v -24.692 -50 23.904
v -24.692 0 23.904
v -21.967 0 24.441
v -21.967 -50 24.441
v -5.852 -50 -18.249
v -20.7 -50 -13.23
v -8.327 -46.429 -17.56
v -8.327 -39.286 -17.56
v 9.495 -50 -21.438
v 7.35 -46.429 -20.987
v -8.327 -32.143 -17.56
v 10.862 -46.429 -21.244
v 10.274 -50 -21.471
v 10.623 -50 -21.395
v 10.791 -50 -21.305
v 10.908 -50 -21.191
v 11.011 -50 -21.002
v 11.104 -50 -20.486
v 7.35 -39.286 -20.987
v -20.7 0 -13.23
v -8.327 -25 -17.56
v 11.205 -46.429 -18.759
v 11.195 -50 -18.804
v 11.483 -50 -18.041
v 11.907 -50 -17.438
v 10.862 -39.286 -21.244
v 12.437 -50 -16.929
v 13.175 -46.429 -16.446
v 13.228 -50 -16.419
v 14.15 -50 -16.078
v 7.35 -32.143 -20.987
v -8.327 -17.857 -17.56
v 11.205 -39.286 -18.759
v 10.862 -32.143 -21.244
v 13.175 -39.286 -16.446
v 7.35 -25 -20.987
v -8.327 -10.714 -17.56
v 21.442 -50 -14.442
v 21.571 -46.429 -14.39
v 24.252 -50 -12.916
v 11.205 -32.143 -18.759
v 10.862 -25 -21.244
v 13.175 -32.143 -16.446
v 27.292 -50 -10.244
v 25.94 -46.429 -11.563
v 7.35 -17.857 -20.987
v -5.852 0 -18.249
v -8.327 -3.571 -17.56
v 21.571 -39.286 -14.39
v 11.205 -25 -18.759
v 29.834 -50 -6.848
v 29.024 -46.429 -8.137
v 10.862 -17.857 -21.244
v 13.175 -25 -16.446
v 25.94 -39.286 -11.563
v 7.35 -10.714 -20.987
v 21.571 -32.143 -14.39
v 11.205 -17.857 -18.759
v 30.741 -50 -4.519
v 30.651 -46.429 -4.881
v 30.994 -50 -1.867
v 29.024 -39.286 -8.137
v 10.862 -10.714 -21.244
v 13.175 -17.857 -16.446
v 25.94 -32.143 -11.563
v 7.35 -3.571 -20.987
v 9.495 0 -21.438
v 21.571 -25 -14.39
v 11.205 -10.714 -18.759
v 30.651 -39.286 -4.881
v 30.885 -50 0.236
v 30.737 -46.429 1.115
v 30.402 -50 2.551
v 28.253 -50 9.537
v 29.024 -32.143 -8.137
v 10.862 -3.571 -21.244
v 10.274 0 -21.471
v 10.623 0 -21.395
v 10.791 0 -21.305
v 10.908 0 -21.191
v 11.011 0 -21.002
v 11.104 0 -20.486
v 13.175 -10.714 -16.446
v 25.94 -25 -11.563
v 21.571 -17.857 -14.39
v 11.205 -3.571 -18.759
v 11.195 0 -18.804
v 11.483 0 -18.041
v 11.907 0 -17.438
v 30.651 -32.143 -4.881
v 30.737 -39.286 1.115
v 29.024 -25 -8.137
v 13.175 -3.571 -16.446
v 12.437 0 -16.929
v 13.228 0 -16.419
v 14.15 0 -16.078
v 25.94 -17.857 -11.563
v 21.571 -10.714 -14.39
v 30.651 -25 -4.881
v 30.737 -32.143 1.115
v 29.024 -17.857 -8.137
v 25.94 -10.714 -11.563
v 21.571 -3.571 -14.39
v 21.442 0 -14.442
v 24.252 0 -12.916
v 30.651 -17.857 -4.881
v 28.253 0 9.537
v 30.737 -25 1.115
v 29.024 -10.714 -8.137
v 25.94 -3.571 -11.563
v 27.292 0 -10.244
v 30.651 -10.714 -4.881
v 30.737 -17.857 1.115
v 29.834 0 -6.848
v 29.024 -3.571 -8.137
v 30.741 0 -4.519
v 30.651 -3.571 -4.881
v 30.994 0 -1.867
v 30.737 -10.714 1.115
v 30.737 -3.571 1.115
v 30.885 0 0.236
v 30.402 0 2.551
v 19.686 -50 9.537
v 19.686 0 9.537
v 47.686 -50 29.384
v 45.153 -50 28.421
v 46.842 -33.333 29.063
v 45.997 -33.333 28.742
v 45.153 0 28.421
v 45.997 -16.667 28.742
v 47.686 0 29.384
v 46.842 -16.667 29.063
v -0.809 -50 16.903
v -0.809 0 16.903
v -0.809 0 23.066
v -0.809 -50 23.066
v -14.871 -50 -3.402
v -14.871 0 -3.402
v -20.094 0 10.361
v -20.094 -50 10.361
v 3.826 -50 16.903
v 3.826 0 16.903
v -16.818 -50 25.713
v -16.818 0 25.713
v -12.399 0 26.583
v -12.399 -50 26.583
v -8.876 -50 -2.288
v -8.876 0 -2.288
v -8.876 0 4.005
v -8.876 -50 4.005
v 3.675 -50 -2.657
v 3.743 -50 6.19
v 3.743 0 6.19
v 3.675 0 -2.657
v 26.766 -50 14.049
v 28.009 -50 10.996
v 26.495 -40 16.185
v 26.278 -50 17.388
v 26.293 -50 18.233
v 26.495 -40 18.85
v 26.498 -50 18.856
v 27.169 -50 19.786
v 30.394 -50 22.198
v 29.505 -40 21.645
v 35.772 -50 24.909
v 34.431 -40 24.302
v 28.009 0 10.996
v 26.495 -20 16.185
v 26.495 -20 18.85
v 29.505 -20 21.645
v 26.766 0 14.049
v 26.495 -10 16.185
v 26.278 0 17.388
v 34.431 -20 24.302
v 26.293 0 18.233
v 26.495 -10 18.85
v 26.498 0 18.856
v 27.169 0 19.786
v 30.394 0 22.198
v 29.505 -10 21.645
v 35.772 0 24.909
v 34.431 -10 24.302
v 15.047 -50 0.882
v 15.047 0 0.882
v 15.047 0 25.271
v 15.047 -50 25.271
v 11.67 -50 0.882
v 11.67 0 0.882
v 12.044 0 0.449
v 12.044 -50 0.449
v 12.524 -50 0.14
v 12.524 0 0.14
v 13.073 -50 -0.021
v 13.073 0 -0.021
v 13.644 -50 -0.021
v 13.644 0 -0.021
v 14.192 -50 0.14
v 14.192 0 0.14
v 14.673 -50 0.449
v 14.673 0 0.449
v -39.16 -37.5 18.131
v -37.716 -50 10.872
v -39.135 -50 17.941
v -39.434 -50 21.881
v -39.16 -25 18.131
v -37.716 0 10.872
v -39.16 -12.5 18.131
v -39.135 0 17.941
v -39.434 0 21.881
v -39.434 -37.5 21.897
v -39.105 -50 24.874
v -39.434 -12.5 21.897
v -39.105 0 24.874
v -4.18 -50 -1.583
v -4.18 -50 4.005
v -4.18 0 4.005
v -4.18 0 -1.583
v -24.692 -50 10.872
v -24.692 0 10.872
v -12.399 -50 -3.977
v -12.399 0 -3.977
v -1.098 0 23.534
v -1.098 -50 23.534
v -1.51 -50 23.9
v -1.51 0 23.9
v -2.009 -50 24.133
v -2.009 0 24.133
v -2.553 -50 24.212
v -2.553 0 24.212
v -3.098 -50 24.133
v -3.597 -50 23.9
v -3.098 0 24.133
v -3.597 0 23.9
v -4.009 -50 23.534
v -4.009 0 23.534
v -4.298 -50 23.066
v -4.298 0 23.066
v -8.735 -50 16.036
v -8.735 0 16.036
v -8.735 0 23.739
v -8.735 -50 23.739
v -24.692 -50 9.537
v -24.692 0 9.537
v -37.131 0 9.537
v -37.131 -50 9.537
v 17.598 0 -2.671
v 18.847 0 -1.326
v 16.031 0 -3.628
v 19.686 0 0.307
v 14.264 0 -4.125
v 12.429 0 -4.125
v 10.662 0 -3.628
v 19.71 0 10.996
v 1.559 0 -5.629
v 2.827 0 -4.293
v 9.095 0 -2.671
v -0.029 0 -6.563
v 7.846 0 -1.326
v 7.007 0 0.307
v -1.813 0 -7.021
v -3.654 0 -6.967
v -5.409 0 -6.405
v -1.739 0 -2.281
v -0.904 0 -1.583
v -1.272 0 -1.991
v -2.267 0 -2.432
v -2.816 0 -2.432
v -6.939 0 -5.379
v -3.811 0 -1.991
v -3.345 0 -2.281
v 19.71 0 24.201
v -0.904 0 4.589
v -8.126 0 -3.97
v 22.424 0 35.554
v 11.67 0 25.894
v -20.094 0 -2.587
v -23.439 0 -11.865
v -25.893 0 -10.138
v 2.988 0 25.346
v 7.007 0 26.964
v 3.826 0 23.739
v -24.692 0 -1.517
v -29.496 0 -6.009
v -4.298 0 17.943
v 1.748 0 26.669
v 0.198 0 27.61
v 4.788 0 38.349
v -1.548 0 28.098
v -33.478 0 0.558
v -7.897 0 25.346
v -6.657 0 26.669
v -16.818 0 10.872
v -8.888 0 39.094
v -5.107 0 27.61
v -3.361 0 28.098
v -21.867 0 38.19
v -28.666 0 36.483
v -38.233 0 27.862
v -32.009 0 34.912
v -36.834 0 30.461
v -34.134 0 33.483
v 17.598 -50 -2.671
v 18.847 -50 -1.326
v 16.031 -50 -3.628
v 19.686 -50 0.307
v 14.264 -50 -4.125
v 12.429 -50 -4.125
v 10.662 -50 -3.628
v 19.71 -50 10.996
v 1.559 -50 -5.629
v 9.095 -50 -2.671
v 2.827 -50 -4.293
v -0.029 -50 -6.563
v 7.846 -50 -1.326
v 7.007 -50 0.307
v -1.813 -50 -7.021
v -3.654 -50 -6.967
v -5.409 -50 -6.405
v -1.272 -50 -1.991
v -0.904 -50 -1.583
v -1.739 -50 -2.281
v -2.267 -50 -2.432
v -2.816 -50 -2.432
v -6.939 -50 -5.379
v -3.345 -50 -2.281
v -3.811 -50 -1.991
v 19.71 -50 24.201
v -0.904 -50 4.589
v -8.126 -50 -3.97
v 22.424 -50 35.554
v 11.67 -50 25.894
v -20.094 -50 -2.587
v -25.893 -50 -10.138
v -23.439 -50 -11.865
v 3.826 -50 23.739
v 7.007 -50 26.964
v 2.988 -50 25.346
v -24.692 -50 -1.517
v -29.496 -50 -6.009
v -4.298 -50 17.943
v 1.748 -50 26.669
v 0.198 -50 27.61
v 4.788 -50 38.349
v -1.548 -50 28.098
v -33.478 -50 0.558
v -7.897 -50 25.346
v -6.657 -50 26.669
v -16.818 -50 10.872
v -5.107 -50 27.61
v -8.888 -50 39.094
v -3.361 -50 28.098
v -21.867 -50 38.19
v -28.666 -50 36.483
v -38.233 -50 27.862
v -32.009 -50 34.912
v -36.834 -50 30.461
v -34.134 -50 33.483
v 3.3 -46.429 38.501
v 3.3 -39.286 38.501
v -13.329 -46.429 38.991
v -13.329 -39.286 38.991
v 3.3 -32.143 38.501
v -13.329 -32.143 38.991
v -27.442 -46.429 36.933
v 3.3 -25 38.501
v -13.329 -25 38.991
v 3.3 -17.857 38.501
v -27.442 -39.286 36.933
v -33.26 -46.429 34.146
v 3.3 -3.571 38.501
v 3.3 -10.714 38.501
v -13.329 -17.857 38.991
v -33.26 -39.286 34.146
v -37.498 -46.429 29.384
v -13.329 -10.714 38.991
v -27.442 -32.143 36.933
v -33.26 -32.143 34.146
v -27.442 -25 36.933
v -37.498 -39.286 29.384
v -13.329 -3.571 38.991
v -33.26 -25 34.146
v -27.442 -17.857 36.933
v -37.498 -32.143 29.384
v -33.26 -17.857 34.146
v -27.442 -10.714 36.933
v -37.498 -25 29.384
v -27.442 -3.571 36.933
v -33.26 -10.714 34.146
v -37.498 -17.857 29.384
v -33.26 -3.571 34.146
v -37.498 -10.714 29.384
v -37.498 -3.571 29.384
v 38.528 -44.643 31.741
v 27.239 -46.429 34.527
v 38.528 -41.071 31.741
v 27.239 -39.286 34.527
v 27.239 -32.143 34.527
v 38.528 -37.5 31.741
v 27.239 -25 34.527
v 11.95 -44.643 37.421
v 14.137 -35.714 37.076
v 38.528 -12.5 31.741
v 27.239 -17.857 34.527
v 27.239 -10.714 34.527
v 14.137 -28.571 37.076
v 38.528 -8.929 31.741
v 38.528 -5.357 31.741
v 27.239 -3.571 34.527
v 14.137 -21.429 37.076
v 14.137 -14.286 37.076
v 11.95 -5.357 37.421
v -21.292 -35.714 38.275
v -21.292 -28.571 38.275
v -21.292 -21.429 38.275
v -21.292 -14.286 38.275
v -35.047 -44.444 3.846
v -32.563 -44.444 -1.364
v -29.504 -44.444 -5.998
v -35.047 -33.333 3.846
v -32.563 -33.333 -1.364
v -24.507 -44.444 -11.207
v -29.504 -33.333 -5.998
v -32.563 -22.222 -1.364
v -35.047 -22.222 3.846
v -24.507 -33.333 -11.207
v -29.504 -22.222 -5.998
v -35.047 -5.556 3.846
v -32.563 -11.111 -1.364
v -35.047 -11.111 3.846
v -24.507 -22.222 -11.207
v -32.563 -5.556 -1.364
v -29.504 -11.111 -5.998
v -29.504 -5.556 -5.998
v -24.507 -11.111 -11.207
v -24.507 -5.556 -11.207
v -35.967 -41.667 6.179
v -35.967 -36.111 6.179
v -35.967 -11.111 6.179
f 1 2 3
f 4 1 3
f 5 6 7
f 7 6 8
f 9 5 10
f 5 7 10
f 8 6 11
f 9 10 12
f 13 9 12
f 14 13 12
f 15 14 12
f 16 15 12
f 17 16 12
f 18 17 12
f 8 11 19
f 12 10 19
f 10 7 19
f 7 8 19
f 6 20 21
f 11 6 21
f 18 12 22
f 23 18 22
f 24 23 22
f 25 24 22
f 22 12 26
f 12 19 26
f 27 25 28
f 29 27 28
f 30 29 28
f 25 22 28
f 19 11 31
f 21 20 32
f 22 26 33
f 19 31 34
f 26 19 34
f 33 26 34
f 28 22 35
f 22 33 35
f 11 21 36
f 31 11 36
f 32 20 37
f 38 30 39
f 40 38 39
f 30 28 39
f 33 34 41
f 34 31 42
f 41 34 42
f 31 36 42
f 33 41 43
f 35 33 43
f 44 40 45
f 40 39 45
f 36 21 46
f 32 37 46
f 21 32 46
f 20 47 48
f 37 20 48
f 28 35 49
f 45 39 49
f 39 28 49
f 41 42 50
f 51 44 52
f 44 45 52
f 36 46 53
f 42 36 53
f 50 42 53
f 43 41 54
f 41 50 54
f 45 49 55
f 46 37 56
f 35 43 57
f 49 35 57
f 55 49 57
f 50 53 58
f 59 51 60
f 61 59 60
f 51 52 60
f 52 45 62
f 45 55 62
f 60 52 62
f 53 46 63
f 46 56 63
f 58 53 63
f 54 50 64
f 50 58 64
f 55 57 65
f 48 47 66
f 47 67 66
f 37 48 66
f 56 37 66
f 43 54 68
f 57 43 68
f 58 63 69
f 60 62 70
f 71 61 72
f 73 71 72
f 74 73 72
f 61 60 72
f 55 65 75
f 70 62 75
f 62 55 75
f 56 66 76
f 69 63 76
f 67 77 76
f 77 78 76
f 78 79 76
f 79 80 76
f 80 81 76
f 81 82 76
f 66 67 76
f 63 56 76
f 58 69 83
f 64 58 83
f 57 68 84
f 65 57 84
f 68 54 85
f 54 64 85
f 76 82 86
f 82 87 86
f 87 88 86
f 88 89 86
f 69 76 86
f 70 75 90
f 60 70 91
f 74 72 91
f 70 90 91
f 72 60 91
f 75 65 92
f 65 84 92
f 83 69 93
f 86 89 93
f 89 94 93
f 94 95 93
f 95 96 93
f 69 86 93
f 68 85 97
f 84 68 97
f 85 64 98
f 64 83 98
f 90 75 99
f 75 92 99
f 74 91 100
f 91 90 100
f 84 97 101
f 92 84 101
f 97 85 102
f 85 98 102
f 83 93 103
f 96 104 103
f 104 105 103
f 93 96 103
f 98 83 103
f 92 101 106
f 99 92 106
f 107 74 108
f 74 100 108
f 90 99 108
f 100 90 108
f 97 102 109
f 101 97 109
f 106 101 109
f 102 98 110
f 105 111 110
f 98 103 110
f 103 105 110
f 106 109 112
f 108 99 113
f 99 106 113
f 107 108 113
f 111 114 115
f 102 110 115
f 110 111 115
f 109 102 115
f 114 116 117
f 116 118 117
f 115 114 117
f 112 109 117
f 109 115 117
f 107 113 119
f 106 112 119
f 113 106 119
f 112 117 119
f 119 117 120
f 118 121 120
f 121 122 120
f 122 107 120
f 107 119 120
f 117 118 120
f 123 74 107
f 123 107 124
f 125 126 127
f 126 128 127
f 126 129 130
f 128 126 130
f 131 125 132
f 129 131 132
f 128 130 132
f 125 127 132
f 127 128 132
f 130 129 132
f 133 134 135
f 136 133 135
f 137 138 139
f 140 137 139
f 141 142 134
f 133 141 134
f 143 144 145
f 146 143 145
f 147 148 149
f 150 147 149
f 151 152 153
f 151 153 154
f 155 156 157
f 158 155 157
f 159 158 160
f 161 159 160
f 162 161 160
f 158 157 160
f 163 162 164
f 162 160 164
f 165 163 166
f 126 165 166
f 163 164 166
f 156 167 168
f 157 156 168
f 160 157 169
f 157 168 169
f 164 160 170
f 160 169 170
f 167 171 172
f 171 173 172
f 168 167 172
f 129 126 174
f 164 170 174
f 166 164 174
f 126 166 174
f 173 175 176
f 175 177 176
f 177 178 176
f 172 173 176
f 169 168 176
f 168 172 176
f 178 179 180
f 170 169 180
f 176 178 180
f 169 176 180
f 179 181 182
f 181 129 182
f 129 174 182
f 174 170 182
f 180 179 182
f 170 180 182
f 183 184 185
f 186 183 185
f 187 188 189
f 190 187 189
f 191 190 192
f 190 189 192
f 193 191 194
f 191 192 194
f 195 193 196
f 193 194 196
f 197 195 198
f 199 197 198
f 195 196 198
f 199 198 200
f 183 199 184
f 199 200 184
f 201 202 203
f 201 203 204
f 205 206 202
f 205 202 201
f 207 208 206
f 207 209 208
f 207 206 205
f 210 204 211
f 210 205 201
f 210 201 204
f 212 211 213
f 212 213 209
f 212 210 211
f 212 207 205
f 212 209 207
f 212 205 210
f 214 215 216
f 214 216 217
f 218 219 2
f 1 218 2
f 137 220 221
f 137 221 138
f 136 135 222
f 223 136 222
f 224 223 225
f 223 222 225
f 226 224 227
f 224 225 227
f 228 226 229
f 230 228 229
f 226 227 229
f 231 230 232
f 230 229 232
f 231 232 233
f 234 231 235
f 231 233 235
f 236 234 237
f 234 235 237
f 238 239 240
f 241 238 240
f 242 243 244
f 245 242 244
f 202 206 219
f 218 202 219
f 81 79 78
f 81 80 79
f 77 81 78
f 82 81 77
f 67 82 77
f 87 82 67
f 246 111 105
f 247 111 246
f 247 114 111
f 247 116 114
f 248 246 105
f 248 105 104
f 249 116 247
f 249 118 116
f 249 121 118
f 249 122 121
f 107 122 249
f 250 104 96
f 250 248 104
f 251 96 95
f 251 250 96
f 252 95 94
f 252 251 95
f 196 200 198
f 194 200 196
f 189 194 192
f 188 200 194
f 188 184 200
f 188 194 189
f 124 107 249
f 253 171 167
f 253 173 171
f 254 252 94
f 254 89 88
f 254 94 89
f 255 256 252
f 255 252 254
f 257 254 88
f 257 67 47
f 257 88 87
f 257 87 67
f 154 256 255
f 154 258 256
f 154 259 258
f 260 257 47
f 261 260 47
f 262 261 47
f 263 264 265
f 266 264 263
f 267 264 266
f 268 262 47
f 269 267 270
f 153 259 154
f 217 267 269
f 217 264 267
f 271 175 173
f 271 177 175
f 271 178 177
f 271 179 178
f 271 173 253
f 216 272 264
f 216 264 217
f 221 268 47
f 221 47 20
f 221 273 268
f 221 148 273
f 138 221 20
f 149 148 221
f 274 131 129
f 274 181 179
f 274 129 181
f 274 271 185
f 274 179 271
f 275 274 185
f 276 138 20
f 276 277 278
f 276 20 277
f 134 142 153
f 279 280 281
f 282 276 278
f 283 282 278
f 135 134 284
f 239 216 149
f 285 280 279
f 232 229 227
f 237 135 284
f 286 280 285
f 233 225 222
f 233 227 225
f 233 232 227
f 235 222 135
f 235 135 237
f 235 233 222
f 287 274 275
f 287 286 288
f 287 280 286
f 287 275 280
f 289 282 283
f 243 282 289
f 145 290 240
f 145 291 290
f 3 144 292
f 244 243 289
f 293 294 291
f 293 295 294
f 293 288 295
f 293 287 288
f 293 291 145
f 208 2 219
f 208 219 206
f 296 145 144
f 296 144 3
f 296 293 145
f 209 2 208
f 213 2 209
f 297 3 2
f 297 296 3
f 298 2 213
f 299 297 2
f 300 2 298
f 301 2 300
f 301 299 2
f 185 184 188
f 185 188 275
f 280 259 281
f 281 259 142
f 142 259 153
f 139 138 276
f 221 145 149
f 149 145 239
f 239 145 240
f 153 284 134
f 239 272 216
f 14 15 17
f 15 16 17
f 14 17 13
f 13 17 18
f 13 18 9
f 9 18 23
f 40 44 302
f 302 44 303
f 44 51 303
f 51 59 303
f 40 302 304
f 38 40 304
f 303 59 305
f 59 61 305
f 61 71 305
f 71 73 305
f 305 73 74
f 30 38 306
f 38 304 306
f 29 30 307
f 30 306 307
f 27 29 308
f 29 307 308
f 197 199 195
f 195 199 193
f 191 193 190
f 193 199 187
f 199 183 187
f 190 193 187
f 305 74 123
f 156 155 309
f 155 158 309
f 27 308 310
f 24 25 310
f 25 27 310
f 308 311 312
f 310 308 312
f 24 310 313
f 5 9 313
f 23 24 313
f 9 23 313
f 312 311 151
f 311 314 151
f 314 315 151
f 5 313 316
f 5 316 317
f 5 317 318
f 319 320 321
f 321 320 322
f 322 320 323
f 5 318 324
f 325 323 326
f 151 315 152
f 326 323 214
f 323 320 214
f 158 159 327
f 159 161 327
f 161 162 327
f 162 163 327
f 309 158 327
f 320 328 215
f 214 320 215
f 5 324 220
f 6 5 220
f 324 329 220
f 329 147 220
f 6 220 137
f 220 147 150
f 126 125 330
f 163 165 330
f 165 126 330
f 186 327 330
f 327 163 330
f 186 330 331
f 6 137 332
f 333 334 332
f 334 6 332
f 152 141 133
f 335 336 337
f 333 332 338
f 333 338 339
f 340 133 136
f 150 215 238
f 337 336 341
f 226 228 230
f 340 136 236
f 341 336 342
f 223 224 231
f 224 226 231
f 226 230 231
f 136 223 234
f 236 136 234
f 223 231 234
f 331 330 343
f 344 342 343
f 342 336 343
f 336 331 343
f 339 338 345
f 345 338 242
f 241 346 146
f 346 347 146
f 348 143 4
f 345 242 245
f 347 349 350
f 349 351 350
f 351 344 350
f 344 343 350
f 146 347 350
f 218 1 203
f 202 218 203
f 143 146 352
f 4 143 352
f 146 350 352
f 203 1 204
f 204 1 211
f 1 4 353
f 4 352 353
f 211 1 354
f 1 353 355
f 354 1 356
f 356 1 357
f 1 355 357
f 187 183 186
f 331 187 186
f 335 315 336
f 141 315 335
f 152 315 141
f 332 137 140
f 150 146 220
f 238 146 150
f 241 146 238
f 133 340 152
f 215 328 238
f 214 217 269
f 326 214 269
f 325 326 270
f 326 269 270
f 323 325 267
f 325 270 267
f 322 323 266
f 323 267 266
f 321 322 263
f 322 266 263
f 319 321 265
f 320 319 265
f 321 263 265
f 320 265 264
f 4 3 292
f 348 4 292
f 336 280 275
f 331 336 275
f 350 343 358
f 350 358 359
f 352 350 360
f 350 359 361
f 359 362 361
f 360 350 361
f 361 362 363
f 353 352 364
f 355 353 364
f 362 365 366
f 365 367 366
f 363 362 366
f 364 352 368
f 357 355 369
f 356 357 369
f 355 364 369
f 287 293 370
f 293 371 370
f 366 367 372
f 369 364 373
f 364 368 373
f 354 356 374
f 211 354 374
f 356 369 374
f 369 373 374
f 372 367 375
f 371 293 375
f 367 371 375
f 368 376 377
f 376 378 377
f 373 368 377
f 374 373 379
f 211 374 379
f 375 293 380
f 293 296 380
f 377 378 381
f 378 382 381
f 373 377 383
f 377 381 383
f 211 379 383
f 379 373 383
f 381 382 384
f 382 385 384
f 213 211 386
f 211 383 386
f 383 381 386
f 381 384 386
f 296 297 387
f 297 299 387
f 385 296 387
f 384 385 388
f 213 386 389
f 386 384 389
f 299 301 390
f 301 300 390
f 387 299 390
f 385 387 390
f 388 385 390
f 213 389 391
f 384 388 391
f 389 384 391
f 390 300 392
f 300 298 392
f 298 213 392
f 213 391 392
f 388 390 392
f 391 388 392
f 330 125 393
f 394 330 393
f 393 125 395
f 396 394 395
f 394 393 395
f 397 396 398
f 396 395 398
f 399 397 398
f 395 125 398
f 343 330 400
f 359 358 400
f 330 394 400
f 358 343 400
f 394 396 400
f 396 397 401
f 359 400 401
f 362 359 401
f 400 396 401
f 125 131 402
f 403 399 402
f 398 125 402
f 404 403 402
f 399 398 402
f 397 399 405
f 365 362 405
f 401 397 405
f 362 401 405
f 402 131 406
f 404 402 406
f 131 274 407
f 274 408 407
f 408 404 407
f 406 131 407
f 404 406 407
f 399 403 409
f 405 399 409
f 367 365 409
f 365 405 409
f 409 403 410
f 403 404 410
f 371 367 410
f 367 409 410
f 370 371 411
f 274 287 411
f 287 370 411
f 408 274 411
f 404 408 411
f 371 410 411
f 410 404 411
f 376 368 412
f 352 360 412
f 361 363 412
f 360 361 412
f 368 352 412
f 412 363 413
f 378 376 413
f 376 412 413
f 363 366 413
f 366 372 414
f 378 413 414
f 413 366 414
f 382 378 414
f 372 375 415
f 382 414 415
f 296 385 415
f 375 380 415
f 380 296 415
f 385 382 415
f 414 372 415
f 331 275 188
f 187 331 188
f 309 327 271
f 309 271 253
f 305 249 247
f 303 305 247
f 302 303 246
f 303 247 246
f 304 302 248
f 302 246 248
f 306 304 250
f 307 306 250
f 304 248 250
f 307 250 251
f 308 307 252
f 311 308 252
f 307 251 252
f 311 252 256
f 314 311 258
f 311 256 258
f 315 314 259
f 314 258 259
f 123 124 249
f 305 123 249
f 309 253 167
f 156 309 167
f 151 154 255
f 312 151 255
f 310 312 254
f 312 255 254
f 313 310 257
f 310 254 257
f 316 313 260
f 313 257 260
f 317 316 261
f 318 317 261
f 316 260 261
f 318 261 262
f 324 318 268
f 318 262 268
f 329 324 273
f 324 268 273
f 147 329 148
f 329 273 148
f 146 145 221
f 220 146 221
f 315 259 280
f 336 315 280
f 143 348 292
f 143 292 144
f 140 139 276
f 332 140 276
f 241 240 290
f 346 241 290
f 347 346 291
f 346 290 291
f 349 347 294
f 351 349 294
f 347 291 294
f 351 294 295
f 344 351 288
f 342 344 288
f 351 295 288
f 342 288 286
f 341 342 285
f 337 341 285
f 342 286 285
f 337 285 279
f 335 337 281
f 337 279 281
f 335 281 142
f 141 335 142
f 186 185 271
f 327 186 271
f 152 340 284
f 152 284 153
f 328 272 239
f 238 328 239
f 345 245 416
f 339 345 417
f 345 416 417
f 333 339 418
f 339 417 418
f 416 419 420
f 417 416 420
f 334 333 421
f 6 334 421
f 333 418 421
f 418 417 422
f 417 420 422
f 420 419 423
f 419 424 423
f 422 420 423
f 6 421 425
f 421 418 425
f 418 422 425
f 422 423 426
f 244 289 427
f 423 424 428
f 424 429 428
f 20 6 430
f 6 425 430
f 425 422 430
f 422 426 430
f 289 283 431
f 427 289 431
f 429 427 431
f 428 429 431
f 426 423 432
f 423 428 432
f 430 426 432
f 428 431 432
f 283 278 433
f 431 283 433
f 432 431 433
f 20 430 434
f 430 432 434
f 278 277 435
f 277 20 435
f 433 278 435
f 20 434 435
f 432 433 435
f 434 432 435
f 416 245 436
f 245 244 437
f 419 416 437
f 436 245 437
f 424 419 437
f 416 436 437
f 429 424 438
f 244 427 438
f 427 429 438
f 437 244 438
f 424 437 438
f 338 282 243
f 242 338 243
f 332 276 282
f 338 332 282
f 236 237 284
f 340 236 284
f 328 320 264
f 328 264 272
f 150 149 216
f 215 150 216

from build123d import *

# Parameters (mm, degrees)
F1_DEPTH = 50


with BuildPart() as f1:
    # F0 (on Front) → F1 (new body)
    with BuildSketch(Plane.XZ):
        with BuildLine():
            add(Edge.make_bspline(
                [(-37.7162061632, 10.8718592674), (-38.0137925928, 12.1718101066), (-38.5932806053, 14.7031954565), (-39.2151447113, 18.0535253196), (-39.5737756392, 22.2902382556), (-39.2482214069, 24.0848133925), (-39.1050204635, 24.8741898686)],
                knots=[0, 0, 0, 0, 0.2633681623, 0.5128550154, 0.7857204286, 1, 1, 1, 1], degree=3))
            Line((-37.7162061632, 10.8718592674), (-24.692427367, 10.8718592674))
            Line((-24.692427367, 10.8718592674), (-24.692427367, 23.9042103876))
            Line((-24.692427367, 23.9042103876), (-21.9665206969, 24.4408212602))
            Line((-21.9665206969, 24.4408212602), (-16.8175846338, 10.8718592674))
            Line((-16.8175846338, 10.8718592674), (-16.8175846338, 25.7129110396))
            Line((-16.8175846338, 25.7129110396), (-12.3989448364, 26.5827464538))
            Line((-12.3989448364, 26.5827464538), (-12.3989448364, -3.9767332708))
            Line((-12.3989448364, -3.9767332708), (-14.8713132367, -3.4016475547))
            Line((-14.8713132367, -3.4016475547), (-20.0936662698, 10.3607897628))
            Line((-20.0936662698, 10.3607897628), (-20.0936662698, -2.5866411161))
            Line((-20.0936662698, -2.5866411161), (-24.692427367, -1.5169454273))
            Line((-24.692427367, -1.5169454273), (-24.692427367, 9.5365801826))
            Line((-24.692427367, 9.5365801826), (-37.1311791241, 9.5365801826))
            add(Edge.make_bspline(
                [(-37.1311791241, 9.5365801826), (-36.6443772184, 8.1203147102), (-35.8128377427, 5.7010952401), (-35.1229162991, 3.9140028803), (-33.4049634325, 0.4825636444), (-32.6630781804, -1.3346058437), (-30.9651065329, -3.9427016689), (-29.509727436, -6.00741778), (-27.5501513285, -8.661576152), (-24.5989748796, -11.4109926011), (-22.0151064088, -12.6163530494), (-20.6999834627, -13.2298506796)],
                knots=[0, 0, 0, 0, 0.1255236338, 0.2144154644, 0.3338929331, 0.4247103788, 0.5323068124, 0.6328042387, 0.7451740805, 0.8703001264, 1, 1, 1, 1], degree=3))
            add(Edge.make_bspline(
                [(-20.6999834627, -13.2298506796), (-16.5301085551, -14.8002632919), (-8.7116046094, -17.7447826065), (1.2763262747, -19.9299698522), (6.8147770756, -20.7539027843), (11.6490305393, -22.1255664797), (10.6555075071, -18.4772007098), (13.1581887862, -16.086599108), (16.052802937, -15.8158127323), (21.8291561008, -14.7409885195), (25.9947312111, -11.7480172987), (29.1240435942, -8.2906086726), (30.8704592823, -5.0116798542), (31.0342548039, -1.7846543849), (30.9307681785, 1.3358652121), (29.2884294917, 6.3647014715), (28.2525438815, 9.5365801826)],
                knots=[0, 0, 0, 0, 0.1156147255, 0.2167772912, 0.2950938275, 0.3550195696, 0.4055888786, 0.4612512734, 0.5157139519, 0.5921829643, 0.6650277241, 0.7335909835, 0.7945111507, 0.8499845334, 0.9053795272, 1, 1, 1, 1], degree=3))
            Line((28.2525438815, 9.5365801826), (19.6858402342, 9.5365801826))
            Line((19.6858402342, 9.5365801826), (19.6858402342, 0.3066004333))
            ThreePointArc((19.6858402342, 0.3066004333), (13.3464820683, -4.1877158784), (7.0071239024, 0.3066004333))
            Line((7.0071239024, 0.3066004333), (7.0071239024, 1.9209996099))
            Line((7.0071239024, 1.9209996099), (7.0071239024, 26.9635599107))
            Line((7.0071239024, 26.9635599107), (11.6702681407, 25.8938632905))
            Line((11.6702681407, 25.8938632905), (11.6702681407, 0.8817345434))
            ThreePointArc((11.6702681407, 0.8817345434), (13.3584048599, -0.0419122917), (15.0465415791, 0.8817345434))
            Line((15.0465415791, 0.8817345434), (15.0465415791, 25.2709649503))
            Line((15.0465415791, 25.2709649503), (19.7096858174, 24.2012683302))
            Line((19.7096858174, 24.2012683302), (19.7096858174, 10.9957624227))
            Line((19.7096858174, 10.9957624227), (28.0085615814, 10.9957624227))
            add(Edge.make_bspline(
                [(28.0085615814, 10.9957624227), (27.5990196151, 11.9018441718), (26.6245147306, 13.5645543288), (26.6498949617, 16.2076869277), (25.4504108103, 19.5450855972), (34.9802563239, 24.9629685602), (41.6594700108, 27.2332369803), (45.1526753604, 28.420900926)],
                knots=[0, 0, 0, 0, 0.1486254949, 0.288932671, 0.4318181156, 0.703383398, 1, 1, 1, 1], degree=3))
            add(Edge.make_bspline(
                [(45.1526753604, 28.420900926), (45.9953943888, 28.7416589757), (46.8432460567, 29.062839935), (47.6859650851, 29.3835979847)],
                knots=[0, 0, 0, 0, 2.7100447332, 2.7100447332, 2.7100447332, 2.7100447332], degree=3))
            add(Edge.make_bspline(
                [(47.6859650851, 29.3835979847), (45.1073037008, 30.0439684401), (39.3418110148, 31.5177252321), (27.2126313622, 34.7029571715), (13.1216955207, 37.3749708143), (3.4336924436, 38.5546282012), (-4.1532333455, 39.1010302943), (-13.2728239958, 39.1506385664), (-21.9850756514, 38.3252473292), (-27.3455135239, 37.1141395602), (-30.6322151669, 35.638712881), (-33.3353144975, 34.2583399157), (-35.8251010864, 32.0303153592), (-37.5549477975, 29.4076102427), (-38.4246526946, 27.5305795614), (-38.9679409564, 25.6325099617), (-39.1050204635, 24.8741898686)],
                knots=[0, 0, 0, 0, 0.0833811733, 0.1860003185, 0.2961218678, 0.3855956178, 0.4642235766, 0.5515208268, 0.6373476746, 0.7043105994, 0.7580079326, 0.8077548361, 0.8604210307, 0.9108905578, 0.9530090083, 1, 1, 1, 1], degree=3))
        make_face()
        with BuildLine():
            ThreePointArc((3.6746582482, -2.6572514325), (-2.7355141183, -7.0583728261), (-8.8756987825, -2.2878056084))
            Line((-8.8756987825, -2.2878056084), (-8.8756987825, 4.004645627))
            Line((-8.8756987825, 4.004645627), (-4.1796290316, 4.004645627))
            Line((-4.1796290316, 4.004645627), (-4.1796290316, -1.5834666556))
            ThreePointArc((-4.1796290316, -1.5834666556), (-2.5416316057, -2.4515089383), (-0.9036341798, -1.5834666556))
            Line((-0.9036341798, -1.5834666556), (-0.9036341798, -0.7915620226))
            Line((-0.9036341798, -0.7915620226), (-0.9036341798, 4.5887495607))
            Line((-0.9036341798, 4.5887495607), (-8.7350774556, 16.0359088331))
            Line((-8.7350774556, 16.0359088331), (-8.7350774556, 23.7385202199))
            ThreePointArc((-8.7350774556, 23.7385202199), (-2.4544686312, 28.1597379043), (3.8261401933, 23.7385202199))
            Line((3.8261401933, 23.7385202199), (3.8261401933, 16.9026460499))
            Line((3.8261401933, 16.9026460499), (-0.8087534225, 16.9026460499))
            Line((-0.8087534225, 16.9026460499), (-0.8087534225, 23.0661313981))
            ThreePointArc((-0.8087534225, 23.0661313981), (-2.5533767766, 24.2122782413), (-4.2980001308, 23.0661313981))
            Line((-4.2980001308, 23.0661313981), (-4.2980001308, 17.9428189131))
            Line((-4.2980001308, 17.9428189131), (3.7426783238, 6.1898222193))
            Line((3.7426783238, 6.1898222193), (3.6746582482, -2.6572514325))
        make_face(mode=Mode.SUBTRACT)
    extrude(amount=F1_DEPTH)


solid = f1.part
